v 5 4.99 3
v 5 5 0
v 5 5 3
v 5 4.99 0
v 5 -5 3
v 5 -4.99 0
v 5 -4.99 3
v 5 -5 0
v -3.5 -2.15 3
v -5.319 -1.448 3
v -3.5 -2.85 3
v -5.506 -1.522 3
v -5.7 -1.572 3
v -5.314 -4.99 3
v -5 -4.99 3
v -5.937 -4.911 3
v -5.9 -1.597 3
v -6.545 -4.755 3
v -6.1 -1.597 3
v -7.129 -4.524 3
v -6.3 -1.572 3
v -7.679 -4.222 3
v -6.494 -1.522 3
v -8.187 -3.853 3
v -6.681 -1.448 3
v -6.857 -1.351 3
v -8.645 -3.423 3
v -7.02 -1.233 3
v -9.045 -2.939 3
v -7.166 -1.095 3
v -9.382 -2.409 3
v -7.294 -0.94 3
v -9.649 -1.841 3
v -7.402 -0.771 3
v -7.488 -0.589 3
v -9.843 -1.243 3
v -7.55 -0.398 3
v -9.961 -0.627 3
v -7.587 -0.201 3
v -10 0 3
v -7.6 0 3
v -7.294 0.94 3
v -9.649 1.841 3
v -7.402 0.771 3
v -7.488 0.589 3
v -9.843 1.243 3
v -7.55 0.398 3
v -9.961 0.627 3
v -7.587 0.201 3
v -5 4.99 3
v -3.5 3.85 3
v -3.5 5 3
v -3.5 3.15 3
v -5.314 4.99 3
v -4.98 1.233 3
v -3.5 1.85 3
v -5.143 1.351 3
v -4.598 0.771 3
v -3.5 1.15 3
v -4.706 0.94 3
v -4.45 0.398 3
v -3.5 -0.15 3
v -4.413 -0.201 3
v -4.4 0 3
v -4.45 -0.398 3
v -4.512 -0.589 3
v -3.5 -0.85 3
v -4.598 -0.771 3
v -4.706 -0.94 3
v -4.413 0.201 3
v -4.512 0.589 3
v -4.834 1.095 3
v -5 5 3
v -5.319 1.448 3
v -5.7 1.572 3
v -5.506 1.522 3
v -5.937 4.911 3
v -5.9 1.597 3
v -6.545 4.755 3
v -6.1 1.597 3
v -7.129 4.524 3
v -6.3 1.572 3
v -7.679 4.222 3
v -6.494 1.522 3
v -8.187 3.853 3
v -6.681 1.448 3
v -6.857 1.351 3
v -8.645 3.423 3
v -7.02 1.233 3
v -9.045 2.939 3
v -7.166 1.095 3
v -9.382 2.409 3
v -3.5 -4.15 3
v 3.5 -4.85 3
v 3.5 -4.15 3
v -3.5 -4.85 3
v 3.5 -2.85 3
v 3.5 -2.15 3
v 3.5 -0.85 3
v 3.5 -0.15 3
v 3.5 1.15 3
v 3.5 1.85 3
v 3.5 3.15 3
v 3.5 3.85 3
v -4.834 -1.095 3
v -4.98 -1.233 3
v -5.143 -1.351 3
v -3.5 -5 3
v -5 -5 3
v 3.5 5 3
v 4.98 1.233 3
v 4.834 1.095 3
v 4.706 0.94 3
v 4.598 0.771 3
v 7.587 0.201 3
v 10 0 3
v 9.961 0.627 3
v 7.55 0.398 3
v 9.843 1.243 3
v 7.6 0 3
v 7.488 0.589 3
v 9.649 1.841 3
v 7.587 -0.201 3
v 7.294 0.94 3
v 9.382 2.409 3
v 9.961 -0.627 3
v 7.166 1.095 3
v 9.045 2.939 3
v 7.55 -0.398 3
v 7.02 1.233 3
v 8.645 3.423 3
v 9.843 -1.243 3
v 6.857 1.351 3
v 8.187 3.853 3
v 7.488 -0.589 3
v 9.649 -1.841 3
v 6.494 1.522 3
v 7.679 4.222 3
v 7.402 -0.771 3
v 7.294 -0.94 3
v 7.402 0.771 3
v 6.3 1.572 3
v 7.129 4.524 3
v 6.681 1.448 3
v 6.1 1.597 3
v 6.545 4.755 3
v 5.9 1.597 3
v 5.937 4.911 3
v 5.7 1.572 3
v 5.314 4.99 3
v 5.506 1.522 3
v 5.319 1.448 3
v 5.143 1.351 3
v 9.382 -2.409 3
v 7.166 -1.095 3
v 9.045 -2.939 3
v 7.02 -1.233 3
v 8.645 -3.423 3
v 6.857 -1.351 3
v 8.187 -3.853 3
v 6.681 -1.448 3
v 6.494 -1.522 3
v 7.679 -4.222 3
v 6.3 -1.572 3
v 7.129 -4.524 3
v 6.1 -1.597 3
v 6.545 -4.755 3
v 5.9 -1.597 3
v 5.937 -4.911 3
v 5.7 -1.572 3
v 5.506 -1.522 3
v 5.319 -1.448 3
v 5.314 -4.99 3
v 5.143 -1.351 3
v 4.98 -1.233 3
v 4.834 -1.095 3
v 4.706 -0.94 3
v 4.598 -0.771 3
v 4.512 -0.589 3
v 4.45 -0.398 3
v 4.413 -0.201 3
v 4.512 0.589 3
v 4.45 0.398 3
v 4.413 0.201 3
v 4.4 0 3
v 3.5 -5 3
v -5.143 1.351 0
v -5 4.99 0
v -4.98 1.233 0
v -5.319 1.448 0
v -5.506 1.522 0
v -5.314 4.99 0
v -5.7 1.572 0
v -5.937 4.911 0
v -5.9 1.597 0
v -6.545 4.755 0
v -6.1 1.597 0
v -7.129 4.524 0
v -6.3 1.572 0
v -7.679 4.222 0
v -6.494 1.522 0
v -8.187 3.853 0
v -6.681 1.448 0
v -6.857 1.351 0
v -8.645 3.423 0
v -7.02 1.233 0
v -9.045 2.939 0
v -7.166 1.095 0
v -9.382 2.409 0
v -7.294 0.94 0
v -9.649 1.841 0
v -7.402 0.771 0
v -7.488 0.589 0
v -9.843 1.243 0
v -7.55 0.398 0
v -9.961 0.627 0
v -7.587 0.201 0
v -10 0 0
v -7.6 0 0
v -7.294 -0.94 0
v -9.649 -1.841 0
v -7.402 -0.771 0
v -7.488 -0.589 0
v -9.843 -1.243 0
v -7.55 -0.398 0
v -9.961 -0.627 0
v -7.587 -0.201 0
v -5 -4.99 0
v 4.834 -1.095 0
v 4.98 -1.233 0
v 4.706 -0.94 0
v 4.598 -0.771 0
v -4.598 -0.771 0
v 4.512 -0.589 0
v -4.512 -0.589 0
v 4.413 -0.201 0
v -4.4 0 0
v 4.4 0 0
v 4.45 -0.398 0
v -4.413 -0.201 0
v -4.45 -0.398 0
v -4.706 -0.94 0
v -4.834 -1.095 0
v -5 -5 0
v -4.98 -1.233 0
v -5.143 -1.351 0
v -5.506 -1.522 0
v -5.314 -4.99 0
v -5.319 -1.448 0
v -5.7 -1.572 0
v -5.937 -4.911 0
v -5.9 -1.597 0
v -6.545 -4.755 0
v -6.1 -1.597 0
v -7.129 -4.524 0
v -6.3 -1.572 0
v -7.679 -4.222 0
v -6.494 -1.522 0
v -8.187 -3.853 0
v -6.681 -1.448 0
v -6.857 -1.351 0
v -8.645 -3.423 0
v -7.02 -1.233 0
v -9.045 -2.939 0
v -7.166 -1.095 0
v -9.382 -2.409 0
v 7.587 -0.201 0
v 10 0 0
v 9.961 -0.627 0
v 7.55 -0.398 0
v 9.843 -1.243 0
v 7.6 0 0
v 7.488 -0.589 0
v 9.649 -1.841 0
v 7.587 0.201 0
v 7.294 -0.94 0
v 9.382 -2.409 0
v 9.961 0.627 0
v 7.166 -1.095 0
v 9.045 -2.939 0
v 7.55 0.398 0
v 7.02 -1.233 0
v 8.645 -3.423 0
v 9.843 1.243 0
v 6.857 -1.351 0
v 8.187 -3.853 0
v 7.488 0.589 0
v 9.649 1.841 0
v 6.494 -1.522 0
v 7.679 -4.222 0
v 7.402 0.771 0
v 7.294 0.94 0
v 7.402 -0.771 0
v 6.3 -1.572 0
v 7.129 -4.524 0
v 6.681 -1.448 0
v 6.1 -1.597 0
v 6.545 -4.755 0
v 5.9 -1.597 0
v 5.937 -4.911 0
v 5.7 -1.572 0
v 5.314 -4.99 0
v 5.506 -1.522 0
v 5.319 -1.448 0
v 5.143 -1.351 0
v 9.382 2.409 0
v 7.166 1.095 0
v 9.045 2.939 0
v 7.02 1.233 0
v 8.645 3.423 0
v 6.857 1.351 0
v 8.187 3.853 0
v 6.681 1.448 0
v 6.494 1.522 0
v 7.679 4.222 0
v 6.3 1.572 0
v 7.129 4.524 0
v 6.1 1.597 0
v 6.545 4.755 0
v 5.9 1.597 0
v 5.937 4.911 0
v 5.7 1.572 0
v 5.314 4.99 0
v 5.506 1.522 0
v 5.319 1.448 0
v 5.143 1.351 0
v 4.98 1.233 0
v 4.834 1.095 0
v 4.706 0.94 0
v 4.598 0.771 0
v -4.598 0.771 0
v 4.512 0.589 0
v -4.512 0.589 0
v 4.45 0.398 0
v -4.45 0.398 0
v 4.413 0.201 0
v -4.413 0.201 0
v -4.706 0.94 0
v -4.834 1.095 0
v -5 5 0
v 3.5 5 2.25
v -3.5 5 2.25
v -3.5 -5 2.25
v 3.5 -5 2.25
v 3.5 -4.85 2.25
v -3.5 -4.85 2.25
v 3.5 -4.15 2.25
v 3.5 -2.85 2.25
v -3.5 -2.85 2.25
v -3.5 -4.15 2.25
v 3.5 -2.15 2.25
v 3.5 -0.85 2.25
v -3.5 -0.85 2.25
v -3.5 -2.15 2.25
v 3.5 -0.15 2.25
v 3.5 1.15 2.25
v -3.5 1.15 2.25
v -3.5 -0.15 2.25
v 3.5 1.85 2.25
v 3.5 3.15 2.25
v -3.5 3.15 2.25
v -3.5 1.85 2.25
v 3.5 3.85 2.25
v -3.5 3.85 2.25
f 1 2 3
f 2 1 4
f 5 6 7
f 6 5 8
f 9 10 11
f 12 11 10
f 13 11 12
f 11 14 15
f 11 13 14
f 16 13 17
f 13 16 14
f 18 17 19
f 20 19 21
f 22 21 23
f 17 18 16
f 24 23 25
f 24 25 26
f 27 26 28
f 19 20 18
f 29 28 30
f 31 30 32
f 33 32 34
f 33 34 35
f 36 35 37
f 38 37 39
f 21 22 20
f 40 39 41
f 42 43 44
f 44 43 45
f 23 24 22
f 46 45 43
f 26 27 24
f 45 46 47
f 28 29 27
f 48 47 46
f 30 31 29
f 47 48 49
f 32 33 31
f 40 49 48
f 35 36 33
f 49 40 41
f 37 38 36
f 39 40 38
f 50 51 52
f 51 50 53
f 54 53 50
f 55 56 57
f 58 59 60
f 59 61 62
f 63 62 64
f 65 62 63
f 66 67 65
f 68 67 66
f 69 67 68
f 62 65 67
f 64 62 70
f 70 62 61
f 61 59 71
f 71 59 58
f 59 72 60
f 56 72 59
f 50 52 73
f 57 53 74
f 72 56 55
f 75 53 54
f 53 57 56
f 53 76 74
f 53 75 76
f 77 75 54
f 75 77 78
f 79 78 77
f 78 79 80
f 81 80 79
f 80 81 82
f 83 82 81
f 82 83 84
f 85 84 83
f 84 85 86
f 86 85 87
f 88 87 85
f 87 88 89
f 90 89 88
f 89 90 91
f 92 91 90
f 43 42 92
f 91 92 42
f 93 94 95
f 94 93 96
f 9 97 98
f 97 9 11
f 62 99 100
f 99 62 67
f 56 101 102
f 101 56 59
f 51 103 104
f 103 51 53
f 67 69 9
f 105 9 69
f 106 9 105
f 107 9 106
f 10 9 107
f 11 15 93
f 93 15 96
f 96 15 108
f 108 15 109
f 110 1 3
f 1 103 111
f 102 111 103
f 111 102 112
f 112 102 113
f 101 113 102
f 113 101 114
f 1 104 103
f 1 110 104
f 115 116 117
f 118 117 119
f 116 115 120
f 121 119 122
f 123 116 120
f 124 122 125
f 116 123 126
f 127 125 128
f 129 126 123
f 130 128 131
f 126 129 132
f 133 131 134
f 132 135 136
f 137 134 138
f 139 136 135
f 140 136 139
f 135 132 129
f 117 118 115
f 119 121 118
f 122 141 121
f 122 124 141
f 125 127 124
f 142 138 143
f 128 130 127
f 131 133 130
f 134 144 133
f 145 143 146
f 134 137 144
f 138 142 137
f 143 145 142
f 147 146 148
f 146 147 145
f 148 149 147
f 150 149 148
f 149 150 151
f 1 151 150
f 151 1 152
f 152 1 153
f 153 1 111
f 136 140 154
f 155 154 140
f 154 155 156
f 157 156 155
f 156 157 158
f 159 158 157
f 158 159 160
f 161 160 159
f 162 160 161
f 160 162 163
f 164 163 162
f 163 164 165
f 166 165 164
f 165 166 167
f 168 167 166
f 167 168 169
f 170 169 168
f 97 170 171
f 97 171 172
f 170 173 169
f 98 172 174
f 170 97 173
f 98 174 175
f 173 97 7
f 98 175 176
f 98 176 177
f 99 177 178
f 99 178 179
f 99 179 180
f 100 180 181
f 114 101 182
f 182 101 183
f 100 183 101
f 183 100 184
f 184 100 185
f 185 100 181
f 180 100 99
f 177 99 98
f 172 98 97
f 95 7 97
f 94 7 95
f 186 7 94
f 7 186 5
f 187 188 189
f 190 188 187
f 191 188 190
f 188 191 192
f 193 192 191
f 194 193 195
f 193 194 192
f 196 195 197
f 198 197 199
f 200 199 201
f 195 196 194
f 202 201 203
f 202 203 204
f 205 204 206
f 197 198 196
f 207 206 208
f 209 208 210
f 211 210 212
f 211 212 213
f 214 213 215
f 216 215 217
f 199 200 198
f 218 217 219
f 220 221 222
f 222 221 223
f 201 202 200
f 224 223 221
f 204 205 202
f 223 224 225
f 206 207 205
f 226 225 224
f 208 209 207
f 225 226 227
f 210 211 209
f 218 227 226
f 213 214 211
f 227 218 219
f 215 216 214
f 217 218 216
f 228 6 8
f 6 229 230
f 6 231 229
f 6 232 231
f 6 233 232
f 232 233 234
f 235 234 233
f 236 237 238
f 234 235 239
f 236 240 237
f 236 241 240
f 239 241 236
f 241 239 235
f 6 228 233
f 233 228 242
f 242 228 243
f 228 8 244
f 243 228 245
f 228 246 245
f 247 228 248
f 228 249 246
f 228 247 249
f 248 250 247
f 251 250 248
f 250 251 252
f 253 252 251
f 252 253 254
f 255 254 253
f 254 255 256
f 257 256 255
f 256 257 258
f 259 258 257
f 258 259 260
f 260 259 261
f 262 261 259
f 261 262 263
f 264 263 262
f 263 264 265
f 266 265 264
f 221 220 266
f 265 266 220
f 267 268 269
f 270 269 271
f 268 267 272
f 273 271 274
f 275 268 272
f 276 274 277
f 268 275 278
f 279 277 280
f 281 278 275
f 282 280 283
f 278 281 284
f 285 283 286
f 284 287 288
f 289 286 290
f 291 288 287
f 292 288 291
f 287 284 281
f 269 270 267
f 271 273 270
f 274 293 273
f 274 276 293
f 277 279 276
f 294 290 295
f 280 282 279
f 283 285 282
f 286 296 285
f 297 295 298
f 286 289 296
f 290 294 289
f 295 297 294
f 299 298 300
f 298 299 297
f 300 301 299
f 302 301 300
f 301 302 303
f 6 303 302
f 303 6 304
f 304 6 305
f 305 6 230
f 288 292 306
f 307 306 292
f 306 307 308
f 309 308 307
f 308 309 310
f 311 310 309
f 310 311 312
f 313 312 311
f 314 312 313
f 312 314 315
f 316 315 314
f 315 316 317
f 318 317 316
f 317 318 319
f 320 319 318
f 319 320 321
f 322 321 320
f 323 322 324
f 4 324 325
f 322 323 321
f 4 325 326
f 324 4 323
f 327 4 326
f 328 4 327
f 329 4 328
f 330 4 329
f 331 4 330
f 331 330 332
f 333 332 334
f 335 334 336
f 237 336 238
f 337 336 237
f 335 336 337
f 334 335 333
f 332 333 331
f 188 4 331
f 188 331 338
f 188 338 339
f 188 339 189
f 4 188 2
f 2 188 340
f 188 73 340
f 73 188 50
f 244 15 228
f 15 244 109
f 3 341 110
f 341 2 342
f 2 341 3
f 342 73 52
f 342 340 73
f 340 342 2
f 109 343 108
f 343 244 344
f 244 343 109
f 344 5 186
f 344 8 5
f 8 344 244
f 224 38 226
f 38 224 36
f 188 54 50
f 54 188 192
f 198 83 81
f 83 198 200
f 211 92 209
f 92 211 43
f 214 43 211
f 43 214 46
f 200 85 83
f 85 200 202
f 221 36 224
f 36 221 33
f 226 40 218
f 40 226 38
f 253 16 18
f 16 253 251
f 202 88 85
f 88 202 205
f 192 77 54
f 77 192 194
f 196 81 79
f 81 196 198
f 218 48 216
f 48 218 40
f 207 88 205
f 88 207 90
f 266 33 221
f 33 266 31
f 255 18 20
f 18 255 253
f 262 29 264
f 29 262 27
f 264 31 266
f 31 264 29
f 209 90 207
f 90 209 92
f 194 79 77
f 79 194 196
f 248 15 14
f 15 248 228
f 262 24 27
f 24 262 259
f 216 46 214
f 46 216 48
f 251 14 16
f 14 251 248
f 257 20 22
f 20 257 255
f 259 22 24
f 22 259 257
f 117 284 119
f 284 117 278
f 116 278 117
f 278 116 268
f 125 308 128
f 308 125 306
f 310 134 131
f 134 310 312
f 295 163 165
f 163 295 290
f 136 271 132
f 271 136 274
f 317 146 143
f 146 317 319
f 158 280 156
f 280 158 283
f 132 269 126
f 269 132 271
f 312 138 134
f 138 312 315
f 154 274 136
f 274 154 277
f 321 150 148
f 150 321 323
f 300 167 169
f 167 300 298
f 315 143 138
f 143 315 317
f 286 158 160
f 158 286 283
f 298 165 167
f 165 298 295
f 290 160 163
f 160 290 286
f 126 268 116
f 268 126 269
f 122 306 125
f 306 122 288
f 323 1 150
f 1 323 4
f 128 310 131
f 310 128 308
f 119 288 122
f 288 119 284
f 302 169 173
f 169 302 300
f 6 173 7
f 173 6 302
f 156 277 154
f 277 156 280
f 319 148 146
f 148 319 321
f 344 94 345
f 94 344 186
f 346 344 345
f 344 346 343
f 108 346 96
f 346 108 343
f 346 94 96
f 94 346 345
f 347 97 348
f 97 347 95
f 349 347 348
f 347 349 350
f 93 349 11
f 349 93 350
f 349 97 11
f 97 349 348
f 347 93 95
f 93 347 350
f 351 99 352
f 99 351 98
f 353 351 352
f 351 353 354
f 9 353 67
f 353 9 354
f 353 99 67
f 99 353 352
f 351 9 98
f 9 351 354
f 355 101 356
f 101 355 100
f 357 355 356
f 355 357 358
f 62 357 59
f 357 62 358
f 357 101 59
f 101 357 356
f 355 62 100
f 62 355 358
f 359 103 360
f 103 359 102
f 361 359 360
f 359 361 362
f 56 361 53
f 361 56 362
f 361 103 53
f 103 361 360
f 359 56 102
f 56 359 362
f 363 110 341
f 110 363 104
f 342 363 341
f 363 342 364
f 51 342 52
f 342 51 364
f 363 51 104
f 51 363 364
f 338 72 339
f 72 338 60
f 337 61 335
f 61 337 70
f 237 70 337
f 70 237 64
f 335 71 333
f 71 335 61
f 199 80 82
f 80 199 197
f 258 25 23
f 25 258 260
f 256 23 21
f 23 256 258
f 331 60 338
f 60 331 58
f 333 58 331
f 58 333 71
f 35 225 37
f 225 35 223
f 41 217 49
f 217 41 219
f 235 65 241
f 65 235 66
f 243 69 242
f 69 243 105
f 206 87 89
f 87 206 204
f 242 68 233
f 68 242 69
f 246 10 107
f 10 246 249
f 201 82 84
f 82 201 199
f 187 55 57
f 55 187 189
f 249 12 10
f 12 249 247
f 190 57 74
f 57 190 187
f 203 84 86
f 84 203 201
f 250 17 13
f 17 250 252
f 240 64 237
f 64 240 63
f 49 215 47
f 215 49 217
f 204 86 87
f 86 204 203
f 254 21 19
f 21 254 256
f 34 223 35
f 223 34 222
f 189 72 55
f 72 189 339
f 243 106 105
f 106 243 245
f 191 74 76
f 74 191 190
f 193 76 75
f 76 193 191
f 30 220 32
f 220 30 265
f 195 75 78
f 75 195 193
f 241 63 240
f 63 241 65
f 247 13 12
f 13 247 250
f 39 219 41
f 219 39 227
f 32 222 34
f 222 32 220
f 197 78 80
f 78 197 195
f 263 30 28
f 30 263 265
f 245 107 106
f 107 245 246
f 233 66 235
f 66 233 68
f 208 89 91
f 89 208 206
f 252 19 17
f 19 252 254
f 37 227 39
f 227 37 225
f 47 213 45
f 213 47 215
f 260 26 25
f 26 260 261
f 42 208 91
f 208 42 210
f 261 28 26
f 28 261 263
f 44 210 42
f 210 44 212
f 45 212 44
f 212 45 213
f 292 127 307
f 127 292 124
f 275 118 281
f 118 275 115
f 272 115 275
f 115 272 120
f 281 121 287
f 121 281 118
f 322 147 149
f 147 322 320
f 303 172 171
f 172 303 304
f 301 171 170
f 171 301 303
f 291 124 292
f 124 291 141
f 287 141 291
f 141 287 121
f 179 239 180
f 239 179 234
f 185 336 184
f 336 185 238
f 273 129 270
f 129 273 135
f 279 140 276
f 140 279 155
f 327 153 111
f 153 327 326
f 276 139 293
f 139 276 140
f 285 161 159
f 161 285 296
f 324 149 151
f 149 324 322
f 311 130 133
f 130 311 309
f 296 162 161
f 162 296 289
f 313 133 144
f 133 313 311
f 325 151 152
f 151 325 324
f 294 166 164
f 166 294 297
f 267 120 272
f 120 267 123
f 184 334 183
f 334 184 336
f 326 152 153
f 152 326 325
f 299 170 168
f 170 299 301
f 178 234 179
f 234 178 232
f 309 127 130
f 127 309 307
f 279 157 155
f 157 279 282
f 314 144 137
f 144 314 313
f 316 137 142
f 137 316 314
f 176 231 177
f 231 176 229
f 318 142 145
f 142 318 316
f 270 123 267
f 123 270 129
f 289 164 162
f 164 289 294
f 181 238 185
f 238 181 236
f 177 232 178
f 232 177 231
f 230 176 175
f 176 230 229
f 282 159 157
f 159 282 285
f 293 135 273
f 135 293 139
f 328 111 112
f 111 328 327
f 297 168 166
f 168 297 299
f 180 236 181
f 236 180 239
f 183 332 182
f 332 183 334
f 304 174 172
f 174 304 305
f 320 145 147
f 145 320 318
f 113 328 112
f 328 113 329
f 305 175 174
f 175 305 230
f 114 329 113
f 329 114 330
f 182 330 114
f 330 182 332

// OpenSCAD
$fn=50;
$clamp_height = 3;
$clamp_width = 10;
$clamp_length = 12;
$belt_pitch = 2;
$belt_width = 7;
$tooth_width = 1.3;
$tooth_height = .75;
$offset = $belt_pitch/4;
$drill3=3.2;

difference(){
    // basic shape
    union(0){
        translate(v = [0,0,$clamp_height/2]) cube([$clamp_length-2,$clamp_width,$clamp_height], center=true);
        translate(v = [-$clamp_length/2+1, 0, 0]) cylinder(r=$clamp_width/2,h=$clamp_height);
        translate(v = [$clamp_length/2-1, 0, 0]) cylinder(r=$clamp_width/2,h=$clamp_height);
        }
    // screw holes
    translate(v = [-$clamp_length/2, 0, -1]) cylinder(h=$clamp_height+2,r=$drill3/2);
    translate(v = [$clamp_length/2, 0, -1]) cylinder(h=$clamp_height+2,r=$drill3/2);
    // belt grip
    translate(v = [0,$offset,$clamp_height-$tooth_height])
    for ( i = [round(-$clamp_width/$belt_pitch/2) : round($clamp_width/$belt_pitch/2)]){
        translate(v = [0,$belt_pitch*i,$tooth_height])cube(size = [$belt_width, $tooth_width, $tooth_height*2], center = true);
    }
}
